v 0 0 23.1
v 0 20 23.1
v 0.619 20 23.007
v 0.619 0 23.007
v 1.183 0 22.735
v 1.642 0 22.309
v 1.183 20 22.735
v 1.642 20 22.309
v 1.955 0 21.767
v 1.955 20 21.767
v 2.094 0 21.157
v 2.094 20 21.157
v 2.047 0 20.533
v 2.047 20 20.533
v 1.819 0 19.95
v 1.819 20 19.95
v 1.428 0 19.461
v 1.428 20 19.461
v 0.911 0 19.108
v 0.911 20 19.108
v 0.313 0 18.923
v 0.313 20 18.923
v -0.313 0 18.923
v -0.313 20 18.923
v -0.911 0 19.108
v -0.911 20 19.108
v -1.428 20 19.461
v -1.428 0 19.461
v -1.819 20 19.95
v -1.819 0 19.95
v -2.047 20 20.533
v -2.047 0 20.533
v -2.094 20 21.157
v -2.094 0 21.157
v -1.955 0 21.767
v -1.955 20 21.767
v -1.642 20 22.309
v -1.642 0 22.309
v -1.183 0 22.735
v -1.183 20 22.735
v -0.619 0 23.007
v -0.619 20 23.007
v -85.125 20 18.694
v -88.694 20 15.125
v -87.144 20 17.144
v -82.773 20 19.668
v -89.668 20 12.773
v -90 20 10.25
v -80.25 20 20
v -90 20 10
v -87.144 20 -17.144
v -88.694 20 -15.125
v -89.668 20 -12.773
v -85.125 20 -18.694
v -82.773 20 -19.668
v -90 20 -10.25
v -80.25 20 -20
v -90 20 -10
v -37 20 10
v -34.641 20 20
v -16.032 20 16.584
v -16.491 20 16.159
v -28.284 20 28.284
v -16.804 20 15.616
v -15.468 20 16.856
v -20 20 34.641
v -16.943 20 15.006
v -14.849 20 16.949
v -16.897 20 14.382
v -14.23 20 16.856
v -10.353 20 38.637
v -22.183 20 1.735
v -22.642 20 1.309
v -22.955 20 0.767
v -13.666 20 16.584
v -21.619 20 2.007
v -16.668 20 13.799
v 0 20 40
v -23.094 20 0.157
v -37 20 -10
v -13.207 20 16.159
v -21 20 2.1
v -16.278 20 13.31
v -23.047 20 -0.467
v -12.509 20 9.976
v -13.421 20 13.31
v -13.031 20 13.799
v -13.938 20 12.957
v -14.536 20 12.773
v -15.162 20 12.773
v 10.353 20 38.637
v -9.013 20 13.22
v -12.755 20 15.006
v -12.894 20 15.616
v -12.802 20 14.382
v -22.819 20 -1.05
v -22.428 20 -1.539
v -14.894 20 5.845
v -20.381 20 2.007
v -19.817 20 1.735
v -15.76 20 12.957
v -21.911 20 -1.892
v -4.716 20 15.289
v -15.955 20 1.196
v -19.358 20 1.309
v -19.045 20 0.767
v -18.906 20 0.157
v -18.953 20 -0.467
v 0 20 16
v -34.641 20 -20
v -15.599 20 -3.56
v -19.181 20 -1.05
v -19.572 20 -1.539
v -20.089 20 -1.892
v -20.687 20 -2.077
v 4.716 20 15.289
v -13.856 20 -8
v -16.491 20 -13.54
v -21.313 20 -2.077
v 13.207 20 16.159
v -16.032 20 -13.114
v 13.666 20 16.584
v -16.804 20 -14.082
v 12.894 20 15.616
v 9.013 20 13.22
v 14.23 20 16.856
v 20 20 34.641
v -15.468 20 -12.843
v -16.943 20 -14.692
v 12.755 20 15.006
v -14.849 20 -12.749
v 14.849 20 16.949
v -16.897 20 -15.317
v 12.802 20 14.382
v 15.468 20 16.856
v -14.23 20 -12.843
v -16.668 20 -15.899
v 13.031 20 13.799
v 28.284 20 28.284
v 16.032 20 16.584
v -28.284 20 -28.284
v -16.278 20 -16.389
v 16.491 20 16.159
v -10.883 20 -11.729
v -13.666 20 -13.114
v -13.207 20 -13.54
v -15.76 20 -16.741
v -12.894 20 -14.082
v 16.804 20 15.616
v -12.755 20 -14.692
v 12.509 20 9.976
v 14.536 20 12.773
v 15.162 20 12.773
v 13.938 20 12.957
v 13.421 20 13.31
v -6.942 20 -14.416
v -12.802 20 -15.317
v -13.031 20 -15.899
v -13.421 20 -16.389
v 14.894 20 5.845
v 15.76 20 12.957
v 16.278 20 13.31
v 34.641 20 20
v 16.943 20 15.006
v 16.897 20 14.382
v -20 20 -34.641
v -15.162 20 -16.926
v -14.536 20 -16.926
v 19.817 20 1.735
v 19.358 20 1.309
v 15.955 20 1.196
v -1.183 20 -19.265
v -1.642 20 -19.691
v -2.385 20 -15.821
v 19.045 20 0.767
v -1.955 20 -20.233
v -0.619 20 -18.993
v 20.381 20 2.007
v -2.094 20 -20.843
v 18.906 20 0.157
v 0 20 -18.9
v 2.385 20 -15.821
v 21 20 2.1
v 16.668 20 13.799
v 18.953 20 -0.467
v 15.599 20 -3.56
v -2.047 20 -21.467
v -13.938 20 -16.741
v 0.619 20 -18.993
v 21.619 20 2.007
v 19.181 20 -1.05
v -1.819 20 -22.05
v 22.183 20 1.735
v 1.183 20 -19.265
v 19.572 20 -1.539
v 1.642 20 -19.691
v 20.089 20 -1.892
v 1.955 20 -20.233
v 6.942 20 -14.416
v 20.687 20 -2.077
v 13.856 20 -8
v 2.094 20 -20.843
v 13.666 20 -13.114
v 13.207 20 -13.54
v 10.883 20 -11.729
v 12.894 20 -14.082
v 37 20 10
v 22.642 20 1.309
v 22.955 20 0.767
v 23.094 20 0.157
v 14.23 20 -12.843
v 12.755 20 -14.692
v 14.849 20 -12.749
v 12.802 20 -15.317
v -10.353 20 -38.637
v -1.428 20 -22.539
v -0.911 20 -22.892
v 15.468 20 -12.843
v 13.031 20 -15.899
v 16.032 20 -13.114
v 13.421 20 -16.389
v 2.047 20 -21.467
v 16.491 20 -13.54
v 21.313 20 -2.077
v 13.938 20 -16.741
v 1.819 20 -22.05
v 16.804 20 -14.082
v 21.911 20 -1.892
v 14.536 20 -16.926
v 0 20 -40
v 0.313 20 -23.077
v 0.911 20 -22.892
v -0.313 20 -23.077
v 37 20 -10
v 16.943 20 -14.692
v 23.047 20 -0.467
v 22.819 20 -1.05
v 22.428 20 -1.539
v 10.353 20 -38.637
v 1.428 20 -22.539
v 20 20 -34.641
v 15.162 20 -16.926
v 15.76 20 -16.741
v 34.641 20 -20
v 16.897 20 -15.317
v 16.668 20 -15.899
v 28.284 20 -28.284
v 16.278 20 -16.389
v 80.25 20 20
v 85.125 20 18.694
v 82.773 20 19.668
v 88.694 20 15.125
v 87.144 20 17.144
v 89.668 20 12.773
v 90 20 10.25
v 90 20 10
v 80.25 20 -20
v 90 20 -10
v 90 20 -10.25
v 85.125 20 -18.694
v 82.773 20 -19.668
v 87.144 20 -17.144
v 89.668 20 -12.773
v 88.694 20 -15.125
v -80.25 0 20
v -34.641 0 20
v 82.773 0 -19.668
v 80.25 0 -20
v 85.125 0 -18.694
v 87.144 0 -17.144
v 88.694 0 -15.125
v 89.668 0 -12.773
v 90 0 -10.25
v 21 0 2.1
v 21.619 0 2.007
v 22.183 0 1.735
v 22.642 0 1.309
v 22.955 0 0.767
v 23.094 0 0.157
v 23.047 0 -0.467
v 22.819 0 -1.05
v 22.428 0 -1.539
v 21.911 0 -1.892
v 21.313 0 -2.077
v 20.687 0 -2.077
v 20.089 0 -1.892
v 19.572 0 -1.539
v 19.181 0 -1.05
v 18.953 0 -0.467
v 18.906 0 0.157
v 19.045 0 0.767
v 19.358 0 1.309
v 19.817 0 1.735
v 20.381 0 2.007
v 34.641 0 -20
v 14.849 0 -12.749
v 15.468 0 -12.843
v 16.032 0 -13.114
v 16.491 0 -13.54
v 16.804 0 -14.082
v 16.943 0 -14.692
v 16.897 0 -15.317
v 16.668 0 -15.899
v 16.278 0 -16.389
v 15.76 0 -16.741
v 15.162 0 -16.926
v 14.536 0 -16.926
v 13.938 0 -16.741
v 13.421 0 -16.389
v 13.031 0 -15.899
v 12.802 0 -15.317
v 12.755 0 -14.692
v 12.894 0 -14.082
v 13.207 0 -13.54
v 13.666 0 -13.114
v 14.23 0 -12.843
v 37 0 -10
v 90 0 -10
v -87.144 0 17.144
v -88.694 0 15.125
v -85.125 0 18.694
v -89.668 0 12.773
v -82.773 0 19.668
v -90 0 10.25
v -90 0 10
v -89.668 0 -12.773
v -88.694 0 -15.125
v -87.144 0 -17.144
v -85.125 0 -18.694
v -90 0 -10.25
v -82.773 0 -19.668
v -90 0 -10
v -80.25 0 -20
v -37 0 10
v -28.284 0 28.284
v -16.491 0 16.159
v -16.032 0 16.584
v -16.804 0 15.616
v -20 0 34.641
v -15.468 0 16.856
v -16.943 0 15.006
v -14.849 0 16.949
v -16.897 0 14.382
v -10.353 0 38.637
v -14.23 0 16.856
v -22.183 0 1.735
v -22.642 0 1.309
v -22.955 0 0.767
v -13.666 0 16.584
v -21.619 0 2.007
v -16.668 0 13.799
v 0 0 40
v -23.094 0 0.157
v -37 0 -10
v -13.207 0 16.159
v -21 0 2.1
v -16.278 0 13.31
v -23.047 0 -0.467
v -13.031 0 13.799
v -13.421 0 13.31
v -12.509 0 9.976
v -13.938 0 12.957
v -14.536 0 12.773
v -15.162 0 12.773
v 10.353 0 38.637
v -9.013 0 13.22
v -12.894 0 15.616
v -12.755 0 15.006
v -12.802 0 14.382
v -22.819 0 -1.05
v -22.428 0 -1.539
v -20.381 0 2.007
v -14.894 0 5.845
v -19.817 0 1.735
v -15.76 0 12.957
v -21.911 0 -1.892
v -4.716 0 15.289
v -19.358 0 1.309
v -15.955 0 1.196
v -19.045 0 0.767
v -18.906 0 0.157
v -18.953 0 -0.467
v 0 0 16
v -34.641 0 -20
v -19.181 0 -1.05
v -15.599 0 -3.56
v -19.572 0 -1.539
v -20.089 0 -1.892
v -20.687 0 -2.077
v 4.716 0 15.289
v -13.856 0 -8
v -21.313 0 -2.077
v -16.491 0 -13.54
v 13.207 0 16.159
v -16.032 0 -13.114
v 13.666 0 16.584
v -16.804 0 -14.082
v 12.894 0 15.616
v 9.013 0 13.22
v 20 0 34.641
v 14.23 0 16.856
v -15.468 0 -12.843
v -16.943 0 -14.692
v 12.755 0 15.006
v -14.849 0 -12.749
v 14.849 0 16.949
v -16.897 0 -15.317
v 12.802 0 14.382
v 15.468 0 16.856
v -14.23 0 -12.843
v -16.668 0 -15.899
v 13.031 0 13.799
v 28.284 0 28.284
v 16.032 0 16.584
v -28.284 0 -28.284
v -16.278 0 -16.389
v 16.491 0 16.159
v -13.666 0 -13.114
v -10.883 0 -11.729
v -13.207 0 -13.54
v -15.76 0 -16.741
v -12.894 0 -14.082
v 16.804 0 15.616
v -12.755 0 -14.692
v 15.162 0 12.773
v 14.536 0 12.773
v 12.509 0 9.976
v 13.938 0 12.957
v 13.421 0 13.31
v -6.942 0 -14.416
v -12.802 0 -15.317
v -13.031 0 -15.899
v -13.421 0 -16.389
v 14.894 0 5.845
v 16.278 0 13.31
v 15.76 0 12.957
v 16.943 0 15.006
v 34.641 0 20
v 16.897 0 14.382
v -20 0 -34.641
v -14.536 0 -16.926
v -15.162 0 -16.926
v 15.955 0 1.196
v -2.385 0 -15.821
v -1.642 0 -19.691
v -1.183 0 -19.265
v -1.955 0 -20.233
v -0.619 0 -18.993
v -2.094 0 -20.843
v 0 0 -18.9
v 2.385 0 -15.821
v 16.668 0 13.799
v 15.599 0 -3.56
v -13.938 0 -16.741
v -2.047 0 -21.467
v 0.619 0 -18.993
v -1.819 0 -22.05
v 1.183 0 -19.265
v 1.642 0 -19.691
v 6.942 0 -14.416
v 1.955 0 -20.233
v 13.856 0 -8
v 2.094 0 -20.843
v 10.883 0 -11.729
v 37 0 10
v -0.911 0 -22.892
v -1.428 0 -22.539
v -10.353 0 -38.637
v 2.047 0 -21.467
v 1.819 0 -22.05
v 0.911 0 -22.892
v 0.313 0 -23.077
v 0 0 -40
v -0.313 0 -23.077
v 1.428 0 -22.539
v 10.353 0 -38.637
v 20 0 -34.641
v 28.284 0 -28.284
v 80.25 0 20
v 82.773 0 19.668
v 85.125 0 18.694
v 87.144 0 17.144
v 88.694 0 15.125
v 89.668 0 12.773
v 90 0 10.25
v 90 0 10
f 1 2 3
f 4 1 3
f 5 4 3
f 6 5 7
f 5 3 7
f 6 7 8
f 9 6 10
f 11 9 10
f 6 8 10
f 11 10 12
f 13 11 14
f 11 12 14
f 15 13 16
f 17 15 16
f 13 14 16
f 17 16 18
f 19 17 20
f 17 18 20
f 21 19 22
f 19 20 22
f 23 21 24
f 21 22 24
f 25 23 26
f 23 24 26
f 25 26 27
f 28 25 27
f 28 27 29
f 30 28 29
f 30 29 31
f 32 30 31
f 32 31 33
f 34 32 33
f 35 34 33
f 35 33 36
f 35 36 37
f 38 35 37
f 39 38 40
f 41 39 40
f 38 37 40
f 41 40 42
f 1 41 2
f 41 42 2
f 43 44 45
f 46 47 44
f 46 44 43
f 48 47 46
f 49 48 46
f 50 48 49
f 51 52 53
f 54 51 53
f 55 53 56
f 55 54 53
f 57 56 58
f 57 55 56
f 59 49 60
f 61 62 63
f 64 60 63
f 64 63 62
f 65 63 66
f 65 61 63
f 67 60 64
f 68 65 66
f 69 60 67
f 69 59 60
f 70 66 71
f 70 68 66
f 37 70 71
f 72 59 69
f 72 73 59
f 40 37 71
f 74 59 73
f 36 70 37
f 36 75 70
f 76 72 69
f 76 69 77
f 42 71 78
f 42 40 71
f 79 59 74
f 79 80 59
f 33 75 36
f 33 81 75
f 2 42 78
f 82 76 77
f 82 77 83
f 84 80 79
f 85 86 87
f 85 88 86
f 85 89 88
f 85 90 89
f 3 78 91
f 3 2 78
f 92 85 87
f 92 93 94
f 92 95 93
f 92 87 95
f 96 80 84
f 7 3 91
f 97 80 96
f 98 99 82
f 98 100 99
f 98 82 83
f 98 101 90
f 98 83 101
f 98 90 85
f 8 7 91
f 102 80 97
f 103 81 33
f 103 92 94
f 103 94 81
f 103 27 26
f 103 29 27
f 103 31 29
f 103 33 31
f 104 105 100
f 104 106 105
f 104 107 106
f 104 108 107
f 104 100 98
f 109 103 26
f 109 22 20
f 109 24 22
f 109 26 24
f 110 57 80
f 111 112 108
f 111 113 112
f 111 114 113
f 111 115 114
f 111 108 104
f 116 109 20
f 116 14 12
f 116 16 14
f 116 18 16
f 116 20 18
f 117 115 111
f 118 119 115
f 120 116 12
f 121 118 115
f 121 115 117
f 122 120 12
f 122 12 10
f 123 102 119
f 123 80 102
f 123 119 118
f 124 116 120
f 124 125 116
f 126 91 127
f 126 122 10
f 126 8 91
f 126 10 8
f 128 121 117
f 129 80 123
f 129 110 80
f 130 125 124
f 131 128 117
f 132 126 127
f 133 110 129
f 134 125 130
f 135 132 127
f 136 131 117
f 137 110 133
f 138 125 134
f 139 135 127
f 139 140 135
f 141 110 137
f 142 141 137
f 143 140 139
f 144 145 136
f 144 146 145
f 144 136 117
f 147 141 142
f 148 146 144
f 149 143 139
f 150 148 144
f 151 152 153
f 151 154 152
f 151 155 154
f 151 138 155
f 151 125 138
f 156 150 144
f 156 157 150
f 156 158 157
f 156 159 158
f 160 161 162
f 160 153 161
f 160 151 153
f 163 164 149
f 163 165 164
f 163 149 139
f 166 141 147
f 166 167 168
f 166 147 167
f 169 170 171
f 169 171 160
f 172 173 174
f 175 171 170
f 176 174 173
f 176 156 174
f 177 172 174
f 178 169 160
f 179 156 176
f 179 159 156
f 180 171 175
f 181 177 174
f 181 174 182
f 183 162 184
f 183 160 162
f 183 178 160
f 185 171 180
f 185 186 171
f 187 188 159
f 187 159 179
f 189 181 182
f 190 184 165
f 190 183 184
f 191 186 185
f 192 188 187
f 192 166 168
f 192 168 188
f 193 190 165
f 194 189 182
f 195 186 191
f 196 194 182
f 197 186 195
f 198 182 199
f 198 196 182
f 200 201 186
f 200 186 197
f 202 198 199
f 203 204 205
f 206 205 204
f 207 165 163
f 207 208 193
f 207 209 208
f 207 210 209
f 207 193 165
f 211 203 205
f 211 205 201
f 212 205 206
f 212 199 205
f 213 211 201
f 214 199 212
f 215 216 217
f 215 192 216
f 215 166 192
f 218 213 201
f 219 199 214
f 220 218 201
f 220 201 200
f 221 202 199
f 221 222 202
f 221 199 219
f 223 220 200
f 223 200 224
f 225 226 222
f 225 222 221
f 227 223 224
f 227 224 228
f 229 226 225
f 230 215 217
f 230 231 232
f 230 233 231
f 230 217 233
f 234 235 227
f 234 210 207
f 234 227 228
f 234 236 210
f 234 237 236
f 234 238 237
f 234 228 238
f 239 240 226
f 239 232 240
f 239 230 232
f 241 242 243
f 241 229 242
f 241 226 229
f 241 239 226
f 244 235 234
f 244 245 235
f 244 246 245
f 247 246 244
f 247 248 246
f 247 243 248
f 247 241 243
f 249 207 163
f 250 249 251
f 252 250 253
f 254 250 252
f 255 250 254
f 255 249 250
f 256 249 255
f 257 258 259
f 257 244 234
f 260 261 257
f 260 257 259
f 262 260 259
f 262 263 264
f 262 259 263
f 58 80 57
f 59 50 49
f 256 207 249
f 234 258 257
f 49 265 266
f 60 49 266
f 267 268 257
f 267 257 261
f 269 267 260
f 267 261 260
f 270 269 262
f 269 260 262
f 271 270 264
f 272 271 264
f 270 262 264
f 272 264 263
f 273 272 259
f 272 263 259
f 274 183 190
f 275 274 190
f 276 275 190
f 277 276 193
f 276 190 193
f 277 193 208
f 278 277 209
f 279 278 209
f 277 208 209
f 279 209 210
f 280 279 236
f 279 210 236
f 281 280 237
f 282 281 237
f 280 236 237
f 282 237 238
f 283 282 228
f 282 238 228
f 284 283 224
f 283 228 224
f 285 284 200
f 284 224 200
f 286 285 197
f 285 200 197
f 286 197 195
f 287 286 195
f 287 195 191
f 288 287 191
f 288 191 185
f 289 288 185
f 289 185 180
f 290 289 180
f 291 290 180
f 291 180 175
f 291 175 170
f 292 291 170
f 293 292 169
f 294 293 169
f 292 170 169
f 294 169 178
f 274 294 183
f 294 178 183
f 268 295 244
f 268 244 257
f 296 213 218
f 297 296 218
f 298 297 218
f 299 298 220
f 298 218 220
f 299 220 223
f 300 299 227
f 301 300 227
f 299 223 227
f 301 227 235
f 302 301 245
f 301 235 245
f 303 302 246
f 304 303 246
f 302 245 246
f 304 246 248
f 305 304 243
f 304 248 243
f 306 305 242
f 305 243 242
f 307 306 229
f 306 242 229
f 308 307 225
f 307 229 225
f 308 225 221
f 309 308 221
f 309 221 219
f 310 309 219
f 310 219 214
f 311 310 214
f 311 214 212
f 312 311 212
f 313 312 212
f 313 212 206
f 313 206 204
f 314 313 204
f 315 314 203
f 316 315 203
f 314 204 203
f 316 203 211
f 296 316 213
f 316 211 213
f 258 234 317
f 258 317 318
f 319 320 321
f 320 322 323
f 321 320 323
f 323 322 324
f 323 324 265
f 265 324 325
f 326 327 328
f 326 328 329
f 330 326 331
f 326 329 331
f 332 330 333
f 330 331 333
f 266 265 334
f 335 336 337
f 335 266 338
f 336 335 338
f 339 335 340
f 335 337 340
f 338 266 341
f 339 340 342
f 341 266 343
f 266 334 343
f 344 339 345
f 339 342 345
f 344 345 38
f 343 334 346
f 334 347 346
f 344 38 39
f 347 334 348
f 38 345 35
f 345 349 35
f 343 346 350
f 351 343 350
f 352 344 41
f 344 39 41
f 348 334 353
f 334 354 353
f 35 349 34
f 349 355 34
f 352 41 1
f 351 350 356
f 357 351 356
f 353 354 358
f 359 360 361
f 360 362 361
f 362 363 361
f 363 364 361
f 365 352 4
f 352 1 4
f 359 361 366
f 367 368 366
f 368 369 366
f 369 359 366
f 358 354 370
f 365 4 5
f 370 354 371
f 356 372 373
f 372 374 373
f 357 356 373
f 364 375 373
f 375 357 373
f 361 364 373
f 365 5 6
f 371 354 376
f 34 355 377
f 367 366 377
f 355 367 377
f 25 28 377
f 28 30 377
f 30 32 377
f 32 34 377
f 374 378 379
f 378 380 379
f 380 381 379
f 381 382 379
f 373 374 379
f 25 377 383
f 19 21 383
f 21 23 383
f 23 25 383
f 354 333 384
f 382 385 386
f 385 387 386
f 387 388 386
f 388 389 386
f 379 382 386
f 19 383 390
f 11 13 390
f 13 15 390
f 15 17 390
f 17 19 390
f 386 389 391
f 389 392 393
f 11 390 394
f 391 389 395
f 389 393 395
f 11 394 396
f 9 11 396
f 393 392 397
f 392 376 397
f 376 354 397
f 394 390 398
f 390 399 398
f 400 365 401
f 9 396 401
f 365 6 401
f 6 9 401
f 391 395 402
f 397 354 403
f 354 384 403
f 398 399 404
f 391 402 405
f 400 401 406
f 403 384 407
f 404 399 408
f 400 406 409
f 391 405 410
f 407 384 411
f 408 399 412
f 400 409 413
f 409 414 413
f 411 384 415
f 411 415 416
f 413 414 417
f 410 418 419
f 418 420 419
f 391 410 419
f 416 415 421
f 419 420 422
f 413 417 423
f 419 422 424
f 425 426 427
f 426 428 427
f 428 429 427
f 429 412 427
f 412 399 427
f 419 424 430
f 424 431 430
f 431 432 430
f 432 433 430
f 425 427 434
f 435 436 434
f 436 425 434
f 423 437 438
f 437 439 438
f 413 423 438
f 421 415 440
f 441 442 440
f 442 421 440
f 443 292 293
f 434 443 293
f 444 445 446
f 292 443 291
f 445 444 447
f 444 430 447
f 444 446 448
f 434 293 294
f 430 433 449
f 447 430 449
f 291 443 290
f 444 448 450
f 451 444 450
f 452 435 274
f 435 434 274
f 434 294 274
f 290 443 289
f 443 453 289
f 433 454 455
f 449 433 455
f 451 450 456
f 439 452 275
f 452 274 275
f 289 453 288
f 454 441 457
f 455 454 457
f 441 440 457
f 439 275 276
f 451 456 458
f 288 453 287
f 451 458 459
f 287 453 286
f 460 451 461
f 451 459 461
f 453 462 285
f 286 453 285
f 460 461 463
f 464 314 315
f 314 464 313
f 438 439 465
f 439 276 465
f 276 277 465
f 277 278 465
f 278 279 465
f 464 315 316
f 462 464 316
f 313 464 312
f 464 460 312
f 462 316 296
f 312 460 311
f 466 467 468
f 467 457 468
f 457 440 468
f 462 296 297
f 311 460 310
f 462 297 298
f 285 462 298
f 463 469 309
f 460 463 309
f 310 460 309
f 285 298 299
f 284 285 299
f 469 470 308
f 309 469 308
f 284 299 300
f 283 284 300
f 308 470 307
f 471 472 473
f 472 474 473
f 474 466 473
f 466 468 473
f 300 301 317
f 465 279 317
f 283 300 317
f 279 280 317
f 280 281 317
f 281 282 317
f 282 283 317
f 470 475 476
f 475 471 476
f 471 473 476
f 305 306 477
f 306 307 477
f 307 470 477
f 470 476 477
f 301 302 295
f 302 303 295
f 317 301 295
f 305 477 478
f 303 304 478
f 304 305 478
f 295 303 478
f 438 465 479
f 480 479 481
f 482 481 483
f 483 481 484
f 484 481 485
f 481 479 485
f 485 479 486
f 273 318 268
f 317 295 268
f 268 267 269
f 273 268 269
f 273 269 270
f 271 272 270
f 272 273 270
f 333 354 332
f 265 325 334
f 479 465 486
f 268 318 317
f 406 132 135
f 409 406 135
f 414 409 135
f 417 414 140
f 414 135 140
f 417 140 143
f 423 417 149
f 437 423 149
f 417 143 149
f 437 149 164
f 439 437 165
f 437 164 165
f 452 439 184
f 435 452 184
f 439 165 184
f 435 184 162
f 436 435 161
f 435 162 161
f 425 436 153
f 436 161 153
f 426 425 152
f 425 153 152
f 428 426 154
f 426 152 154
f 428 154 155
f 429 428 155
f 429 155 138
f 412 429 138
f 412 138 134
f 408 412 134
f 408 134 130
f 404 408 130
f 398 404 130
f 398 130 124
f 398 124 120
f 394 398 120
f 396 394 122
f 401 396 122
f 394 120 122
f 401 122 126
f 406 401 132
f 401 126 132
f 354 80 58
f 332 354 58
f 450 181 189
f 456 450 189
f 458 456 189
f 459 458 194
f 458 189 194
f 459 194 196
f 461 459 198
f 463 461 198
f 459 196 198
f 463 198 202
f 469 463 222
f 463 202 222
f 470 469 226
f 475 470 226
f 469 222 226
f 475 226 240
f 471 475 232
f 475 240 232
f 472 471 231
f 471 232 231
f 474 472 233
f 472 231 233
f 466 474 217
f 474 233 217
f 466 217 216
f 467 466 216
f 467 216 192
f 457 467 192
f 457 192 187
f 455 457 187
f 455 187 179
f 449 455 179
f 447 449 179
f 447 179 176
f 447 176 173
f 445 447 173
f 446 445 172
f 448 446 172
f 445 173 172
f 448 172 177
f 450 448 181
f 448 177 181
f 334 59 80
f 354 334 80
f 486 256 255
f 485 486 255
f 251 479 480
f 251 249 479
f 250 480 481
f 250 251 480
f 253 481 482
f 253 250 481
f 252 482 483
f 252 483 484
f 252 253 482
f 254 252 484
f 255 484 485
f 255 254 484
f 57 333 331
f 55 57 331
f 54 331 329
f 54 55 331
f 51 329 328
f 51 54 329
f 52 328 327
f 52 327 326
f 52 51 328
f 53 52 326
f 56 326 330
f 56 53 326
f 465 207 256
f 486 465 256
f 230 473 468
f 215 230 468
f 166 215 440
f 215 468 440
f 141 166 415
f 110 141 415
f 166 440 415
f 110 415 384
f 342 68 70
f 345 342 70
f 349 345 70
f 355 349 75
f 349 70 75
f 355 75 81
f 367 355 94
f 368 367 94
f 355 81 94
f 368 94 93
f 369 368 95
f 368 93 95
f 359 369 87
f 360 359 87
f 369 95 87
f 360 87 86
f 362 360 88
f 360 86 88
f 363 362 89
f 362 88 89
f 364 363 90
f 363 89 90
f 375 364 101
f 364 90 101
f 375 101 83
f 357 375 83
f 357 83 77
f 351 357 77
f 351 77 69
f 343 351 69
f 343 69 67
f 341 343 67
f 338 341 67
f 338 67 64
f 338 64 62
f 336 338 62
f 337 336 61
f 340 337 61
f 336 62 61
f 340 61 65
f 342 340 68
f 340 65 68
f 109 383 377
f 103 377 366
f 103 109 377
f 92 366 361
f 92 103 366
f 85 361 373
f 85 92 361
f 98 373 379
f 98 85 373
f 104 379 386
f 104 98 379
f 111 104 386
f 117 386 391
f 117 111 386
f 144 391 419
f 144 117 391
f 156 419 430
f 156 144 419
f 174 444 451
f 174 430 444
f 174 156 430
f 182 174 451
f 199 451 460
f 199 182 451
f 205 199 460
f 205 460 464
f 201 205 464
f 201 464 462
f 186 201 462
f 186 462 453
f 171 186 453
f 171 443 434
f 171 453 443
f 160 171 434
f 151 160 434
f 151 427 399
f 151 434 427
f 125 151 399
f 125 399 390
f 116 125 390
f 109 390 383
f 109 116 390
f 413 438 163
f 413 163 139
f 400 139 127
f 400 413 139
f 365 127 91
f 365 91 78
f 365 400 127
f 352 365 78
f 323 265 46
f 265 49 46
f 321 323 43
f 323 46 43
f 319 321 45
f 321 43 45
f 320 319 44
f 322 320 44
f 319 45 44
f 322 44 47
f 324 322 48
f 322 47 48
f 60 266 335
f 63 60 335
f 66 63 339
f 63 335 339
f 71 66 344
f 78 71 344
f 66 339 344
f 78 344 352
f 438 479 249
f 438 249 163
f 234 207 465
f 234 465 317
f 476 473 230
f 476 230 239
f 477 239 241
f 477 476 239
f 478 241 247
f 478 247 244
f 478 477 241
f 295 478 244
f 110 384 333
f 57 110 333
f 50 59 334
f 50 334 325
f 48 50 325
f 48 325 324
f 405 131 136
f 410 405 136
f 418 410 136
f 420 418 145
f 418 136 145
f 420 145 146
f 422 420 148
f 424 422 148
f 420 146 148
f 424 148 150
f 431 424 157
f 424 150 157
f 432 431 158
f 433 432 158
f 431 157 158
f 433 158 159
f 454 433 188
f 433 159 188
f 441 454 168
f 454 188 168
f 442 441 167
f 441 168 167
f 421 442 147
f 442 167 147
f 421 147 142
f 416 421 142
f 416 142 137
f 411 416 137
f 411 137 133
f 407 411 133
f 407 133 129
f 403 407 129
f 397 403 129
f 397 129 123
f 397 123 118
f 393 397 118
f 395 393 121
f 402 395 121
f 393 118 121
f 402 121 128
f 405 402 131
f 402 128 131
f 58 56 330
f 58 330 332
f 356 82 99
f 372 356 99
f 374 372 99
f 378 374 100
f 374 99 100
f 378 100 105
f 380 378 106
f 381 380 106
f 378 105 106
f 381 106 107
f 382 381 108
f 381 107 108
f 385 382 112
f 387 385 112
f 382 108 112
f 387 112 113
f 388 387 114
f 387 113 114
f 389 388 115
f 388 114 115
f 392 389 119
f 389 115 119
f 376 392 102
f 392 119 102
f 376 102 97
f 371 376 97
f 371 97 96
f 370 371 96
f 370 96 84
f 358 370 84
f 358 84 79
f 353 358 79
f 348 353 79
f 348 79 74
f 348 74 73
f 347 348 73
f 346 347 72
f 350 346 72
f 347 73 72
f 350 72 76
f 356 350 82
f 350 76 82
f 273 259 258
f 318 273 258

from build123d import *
from build123d.topology import SkipClean

# Parameters (mm, degrees)
BOSS_EXTRUDE1_DEPTH  = 20
SKETCH2_W            = 53
SKETCH2_H            = 20
CUT_EXTRUDE1_DEPTH   = 20
FILLET1_R            = 9.75
FILLET1_OF_MIRROR4_R = 9.75
SKETCH4_R            = 2.1
CUT_EXTRUDE3_DEPTH   = 20


with BuildPart() as part:
    # Sketch1 → Boss-Extrude1 (new body)
    with BuildSketch(Plane(origin=(0, 0, 0), x_dir=(1, 0, 0), z_dir=(0, 1, 0))):
        with BuildLine():
            Line((34.641016151, 20), (90, 20))
            Line((90, 20), (90, -20))
            Line((90, -20), (34.641016151, -20))
            ThreePointArc((34.641016151, -20), (20, -34.641016151), (0, -40))
            Line((0, -40), (0, -20))
            Line((0, -20), (0, 20))
            Line((0, 20), (0, 40))
            ThreePointArc((0, 40), (20, 34.641016151), (34.641016151, 20))
        make_face()
    boss_extrude1 = extrude(amount=BOSS_EXTRUDE1_DEPTH)

    # Sketch2 → Cut-Extrude1 (cut)
    with BuildSketch(Plane(origin=(0, 20, 0), x_dir=(1, 0, 0), z_dir=(0, 1, 0))):
        with BuildLine():
            Line((0, 16), (0, -16))
            ThreePointArc((0, -16), (16, 0), (0, 16))
        make_face()
        with Locations((63.5, 0)):
            Rectangle(SKETCH2_W, SKETCH2_H)
    cut_extrude1 = extrude(amount=-CUT_EXTRUDE1_DEPTH, mode=Mode.SUBTRACT)

    # Fillet1
    fillet1_edges = [part.edges().sort_by_distance(p)[0] for p in [
        (90, 10, -20),
        (90, 10, 20),
    ]]
    fillet(fillet1_edges, radius=FILLET1_R)

    # Mirror4: Boss-Extrude1, Cut-Extrude1 across plane
    with SkipClean():  # the faces are left unmerged after this step: merging them gives an invalid solid
        add(boss_extrude1.mirror(Plane(origin=(0, 0, 0), x_dir=(0, 0, 1), z_dir=(1, 0, 0))))
        add(cut_extrude1.mirror(Plane(origin=(0, 0, 0), x_dir=(0, 0, 1), z_dir=(1, 0, 0))), mode=Mode.SUBTRACT)
    add(part.part.scale(1), mode=Mode.REPLACE)  # the faces are merged on a copy

    # Fillet1 of Mirror4
    fillet1_of_mirror4_edges = [part.edges().sort_by_distance(p)[0] for p in [
        (-90, 10, -20),
        (-90, 10, 20),
    ]]
    fillet(fillet1_of_mirror4_edges, radius=FILLET1_OF_MIRROR4_R)

    # Sketch4 → Cut-Extrude3 (cut)
    with BuildSketch(Plane(origin=(0, 20, 0), x_dir=(1, 0, 0), z_dir=(0, 1, 0))):
        with Locations(Location((21, 0, 0), (0, 0, 270))):
            Circle(SKETCH4_R)
        with Locations(Location((14.849242405, -14.849242405, 0), (0, 0, 270))):
            Circle(SKETCH4_R)
        with Locations(Location((0, -21, 0), (0, 0, 270))):
            Circle(SKETCH4_R)
        with Locations(Location((-14.849242405, -14.849242405, 0), (0, 0, 270))):
            Circle(SKETCH4_R)
        with Locations(Location((-21, 0, 0), (0, 0, 270))):
            Circle(SKETCH4_R)
        with Locations(Location((-14.849242405, 14.849242405, 0), (0, 0, 270))):
            Circle(SKETCH4_R)
        with Locations(Location((0, 21, 0), (0, 0, 270))):
            Circle(SKETCH4_R)
        with Locations(Location((14.849242405, 14.849242405, 0), (0, 0, 270))):
            Circle(SKETCH4_R)
    extrude(amount=-CUT_EXTRUDE3_DEPTH, mode=Mode.SUBTRACT)


solid = part.part
